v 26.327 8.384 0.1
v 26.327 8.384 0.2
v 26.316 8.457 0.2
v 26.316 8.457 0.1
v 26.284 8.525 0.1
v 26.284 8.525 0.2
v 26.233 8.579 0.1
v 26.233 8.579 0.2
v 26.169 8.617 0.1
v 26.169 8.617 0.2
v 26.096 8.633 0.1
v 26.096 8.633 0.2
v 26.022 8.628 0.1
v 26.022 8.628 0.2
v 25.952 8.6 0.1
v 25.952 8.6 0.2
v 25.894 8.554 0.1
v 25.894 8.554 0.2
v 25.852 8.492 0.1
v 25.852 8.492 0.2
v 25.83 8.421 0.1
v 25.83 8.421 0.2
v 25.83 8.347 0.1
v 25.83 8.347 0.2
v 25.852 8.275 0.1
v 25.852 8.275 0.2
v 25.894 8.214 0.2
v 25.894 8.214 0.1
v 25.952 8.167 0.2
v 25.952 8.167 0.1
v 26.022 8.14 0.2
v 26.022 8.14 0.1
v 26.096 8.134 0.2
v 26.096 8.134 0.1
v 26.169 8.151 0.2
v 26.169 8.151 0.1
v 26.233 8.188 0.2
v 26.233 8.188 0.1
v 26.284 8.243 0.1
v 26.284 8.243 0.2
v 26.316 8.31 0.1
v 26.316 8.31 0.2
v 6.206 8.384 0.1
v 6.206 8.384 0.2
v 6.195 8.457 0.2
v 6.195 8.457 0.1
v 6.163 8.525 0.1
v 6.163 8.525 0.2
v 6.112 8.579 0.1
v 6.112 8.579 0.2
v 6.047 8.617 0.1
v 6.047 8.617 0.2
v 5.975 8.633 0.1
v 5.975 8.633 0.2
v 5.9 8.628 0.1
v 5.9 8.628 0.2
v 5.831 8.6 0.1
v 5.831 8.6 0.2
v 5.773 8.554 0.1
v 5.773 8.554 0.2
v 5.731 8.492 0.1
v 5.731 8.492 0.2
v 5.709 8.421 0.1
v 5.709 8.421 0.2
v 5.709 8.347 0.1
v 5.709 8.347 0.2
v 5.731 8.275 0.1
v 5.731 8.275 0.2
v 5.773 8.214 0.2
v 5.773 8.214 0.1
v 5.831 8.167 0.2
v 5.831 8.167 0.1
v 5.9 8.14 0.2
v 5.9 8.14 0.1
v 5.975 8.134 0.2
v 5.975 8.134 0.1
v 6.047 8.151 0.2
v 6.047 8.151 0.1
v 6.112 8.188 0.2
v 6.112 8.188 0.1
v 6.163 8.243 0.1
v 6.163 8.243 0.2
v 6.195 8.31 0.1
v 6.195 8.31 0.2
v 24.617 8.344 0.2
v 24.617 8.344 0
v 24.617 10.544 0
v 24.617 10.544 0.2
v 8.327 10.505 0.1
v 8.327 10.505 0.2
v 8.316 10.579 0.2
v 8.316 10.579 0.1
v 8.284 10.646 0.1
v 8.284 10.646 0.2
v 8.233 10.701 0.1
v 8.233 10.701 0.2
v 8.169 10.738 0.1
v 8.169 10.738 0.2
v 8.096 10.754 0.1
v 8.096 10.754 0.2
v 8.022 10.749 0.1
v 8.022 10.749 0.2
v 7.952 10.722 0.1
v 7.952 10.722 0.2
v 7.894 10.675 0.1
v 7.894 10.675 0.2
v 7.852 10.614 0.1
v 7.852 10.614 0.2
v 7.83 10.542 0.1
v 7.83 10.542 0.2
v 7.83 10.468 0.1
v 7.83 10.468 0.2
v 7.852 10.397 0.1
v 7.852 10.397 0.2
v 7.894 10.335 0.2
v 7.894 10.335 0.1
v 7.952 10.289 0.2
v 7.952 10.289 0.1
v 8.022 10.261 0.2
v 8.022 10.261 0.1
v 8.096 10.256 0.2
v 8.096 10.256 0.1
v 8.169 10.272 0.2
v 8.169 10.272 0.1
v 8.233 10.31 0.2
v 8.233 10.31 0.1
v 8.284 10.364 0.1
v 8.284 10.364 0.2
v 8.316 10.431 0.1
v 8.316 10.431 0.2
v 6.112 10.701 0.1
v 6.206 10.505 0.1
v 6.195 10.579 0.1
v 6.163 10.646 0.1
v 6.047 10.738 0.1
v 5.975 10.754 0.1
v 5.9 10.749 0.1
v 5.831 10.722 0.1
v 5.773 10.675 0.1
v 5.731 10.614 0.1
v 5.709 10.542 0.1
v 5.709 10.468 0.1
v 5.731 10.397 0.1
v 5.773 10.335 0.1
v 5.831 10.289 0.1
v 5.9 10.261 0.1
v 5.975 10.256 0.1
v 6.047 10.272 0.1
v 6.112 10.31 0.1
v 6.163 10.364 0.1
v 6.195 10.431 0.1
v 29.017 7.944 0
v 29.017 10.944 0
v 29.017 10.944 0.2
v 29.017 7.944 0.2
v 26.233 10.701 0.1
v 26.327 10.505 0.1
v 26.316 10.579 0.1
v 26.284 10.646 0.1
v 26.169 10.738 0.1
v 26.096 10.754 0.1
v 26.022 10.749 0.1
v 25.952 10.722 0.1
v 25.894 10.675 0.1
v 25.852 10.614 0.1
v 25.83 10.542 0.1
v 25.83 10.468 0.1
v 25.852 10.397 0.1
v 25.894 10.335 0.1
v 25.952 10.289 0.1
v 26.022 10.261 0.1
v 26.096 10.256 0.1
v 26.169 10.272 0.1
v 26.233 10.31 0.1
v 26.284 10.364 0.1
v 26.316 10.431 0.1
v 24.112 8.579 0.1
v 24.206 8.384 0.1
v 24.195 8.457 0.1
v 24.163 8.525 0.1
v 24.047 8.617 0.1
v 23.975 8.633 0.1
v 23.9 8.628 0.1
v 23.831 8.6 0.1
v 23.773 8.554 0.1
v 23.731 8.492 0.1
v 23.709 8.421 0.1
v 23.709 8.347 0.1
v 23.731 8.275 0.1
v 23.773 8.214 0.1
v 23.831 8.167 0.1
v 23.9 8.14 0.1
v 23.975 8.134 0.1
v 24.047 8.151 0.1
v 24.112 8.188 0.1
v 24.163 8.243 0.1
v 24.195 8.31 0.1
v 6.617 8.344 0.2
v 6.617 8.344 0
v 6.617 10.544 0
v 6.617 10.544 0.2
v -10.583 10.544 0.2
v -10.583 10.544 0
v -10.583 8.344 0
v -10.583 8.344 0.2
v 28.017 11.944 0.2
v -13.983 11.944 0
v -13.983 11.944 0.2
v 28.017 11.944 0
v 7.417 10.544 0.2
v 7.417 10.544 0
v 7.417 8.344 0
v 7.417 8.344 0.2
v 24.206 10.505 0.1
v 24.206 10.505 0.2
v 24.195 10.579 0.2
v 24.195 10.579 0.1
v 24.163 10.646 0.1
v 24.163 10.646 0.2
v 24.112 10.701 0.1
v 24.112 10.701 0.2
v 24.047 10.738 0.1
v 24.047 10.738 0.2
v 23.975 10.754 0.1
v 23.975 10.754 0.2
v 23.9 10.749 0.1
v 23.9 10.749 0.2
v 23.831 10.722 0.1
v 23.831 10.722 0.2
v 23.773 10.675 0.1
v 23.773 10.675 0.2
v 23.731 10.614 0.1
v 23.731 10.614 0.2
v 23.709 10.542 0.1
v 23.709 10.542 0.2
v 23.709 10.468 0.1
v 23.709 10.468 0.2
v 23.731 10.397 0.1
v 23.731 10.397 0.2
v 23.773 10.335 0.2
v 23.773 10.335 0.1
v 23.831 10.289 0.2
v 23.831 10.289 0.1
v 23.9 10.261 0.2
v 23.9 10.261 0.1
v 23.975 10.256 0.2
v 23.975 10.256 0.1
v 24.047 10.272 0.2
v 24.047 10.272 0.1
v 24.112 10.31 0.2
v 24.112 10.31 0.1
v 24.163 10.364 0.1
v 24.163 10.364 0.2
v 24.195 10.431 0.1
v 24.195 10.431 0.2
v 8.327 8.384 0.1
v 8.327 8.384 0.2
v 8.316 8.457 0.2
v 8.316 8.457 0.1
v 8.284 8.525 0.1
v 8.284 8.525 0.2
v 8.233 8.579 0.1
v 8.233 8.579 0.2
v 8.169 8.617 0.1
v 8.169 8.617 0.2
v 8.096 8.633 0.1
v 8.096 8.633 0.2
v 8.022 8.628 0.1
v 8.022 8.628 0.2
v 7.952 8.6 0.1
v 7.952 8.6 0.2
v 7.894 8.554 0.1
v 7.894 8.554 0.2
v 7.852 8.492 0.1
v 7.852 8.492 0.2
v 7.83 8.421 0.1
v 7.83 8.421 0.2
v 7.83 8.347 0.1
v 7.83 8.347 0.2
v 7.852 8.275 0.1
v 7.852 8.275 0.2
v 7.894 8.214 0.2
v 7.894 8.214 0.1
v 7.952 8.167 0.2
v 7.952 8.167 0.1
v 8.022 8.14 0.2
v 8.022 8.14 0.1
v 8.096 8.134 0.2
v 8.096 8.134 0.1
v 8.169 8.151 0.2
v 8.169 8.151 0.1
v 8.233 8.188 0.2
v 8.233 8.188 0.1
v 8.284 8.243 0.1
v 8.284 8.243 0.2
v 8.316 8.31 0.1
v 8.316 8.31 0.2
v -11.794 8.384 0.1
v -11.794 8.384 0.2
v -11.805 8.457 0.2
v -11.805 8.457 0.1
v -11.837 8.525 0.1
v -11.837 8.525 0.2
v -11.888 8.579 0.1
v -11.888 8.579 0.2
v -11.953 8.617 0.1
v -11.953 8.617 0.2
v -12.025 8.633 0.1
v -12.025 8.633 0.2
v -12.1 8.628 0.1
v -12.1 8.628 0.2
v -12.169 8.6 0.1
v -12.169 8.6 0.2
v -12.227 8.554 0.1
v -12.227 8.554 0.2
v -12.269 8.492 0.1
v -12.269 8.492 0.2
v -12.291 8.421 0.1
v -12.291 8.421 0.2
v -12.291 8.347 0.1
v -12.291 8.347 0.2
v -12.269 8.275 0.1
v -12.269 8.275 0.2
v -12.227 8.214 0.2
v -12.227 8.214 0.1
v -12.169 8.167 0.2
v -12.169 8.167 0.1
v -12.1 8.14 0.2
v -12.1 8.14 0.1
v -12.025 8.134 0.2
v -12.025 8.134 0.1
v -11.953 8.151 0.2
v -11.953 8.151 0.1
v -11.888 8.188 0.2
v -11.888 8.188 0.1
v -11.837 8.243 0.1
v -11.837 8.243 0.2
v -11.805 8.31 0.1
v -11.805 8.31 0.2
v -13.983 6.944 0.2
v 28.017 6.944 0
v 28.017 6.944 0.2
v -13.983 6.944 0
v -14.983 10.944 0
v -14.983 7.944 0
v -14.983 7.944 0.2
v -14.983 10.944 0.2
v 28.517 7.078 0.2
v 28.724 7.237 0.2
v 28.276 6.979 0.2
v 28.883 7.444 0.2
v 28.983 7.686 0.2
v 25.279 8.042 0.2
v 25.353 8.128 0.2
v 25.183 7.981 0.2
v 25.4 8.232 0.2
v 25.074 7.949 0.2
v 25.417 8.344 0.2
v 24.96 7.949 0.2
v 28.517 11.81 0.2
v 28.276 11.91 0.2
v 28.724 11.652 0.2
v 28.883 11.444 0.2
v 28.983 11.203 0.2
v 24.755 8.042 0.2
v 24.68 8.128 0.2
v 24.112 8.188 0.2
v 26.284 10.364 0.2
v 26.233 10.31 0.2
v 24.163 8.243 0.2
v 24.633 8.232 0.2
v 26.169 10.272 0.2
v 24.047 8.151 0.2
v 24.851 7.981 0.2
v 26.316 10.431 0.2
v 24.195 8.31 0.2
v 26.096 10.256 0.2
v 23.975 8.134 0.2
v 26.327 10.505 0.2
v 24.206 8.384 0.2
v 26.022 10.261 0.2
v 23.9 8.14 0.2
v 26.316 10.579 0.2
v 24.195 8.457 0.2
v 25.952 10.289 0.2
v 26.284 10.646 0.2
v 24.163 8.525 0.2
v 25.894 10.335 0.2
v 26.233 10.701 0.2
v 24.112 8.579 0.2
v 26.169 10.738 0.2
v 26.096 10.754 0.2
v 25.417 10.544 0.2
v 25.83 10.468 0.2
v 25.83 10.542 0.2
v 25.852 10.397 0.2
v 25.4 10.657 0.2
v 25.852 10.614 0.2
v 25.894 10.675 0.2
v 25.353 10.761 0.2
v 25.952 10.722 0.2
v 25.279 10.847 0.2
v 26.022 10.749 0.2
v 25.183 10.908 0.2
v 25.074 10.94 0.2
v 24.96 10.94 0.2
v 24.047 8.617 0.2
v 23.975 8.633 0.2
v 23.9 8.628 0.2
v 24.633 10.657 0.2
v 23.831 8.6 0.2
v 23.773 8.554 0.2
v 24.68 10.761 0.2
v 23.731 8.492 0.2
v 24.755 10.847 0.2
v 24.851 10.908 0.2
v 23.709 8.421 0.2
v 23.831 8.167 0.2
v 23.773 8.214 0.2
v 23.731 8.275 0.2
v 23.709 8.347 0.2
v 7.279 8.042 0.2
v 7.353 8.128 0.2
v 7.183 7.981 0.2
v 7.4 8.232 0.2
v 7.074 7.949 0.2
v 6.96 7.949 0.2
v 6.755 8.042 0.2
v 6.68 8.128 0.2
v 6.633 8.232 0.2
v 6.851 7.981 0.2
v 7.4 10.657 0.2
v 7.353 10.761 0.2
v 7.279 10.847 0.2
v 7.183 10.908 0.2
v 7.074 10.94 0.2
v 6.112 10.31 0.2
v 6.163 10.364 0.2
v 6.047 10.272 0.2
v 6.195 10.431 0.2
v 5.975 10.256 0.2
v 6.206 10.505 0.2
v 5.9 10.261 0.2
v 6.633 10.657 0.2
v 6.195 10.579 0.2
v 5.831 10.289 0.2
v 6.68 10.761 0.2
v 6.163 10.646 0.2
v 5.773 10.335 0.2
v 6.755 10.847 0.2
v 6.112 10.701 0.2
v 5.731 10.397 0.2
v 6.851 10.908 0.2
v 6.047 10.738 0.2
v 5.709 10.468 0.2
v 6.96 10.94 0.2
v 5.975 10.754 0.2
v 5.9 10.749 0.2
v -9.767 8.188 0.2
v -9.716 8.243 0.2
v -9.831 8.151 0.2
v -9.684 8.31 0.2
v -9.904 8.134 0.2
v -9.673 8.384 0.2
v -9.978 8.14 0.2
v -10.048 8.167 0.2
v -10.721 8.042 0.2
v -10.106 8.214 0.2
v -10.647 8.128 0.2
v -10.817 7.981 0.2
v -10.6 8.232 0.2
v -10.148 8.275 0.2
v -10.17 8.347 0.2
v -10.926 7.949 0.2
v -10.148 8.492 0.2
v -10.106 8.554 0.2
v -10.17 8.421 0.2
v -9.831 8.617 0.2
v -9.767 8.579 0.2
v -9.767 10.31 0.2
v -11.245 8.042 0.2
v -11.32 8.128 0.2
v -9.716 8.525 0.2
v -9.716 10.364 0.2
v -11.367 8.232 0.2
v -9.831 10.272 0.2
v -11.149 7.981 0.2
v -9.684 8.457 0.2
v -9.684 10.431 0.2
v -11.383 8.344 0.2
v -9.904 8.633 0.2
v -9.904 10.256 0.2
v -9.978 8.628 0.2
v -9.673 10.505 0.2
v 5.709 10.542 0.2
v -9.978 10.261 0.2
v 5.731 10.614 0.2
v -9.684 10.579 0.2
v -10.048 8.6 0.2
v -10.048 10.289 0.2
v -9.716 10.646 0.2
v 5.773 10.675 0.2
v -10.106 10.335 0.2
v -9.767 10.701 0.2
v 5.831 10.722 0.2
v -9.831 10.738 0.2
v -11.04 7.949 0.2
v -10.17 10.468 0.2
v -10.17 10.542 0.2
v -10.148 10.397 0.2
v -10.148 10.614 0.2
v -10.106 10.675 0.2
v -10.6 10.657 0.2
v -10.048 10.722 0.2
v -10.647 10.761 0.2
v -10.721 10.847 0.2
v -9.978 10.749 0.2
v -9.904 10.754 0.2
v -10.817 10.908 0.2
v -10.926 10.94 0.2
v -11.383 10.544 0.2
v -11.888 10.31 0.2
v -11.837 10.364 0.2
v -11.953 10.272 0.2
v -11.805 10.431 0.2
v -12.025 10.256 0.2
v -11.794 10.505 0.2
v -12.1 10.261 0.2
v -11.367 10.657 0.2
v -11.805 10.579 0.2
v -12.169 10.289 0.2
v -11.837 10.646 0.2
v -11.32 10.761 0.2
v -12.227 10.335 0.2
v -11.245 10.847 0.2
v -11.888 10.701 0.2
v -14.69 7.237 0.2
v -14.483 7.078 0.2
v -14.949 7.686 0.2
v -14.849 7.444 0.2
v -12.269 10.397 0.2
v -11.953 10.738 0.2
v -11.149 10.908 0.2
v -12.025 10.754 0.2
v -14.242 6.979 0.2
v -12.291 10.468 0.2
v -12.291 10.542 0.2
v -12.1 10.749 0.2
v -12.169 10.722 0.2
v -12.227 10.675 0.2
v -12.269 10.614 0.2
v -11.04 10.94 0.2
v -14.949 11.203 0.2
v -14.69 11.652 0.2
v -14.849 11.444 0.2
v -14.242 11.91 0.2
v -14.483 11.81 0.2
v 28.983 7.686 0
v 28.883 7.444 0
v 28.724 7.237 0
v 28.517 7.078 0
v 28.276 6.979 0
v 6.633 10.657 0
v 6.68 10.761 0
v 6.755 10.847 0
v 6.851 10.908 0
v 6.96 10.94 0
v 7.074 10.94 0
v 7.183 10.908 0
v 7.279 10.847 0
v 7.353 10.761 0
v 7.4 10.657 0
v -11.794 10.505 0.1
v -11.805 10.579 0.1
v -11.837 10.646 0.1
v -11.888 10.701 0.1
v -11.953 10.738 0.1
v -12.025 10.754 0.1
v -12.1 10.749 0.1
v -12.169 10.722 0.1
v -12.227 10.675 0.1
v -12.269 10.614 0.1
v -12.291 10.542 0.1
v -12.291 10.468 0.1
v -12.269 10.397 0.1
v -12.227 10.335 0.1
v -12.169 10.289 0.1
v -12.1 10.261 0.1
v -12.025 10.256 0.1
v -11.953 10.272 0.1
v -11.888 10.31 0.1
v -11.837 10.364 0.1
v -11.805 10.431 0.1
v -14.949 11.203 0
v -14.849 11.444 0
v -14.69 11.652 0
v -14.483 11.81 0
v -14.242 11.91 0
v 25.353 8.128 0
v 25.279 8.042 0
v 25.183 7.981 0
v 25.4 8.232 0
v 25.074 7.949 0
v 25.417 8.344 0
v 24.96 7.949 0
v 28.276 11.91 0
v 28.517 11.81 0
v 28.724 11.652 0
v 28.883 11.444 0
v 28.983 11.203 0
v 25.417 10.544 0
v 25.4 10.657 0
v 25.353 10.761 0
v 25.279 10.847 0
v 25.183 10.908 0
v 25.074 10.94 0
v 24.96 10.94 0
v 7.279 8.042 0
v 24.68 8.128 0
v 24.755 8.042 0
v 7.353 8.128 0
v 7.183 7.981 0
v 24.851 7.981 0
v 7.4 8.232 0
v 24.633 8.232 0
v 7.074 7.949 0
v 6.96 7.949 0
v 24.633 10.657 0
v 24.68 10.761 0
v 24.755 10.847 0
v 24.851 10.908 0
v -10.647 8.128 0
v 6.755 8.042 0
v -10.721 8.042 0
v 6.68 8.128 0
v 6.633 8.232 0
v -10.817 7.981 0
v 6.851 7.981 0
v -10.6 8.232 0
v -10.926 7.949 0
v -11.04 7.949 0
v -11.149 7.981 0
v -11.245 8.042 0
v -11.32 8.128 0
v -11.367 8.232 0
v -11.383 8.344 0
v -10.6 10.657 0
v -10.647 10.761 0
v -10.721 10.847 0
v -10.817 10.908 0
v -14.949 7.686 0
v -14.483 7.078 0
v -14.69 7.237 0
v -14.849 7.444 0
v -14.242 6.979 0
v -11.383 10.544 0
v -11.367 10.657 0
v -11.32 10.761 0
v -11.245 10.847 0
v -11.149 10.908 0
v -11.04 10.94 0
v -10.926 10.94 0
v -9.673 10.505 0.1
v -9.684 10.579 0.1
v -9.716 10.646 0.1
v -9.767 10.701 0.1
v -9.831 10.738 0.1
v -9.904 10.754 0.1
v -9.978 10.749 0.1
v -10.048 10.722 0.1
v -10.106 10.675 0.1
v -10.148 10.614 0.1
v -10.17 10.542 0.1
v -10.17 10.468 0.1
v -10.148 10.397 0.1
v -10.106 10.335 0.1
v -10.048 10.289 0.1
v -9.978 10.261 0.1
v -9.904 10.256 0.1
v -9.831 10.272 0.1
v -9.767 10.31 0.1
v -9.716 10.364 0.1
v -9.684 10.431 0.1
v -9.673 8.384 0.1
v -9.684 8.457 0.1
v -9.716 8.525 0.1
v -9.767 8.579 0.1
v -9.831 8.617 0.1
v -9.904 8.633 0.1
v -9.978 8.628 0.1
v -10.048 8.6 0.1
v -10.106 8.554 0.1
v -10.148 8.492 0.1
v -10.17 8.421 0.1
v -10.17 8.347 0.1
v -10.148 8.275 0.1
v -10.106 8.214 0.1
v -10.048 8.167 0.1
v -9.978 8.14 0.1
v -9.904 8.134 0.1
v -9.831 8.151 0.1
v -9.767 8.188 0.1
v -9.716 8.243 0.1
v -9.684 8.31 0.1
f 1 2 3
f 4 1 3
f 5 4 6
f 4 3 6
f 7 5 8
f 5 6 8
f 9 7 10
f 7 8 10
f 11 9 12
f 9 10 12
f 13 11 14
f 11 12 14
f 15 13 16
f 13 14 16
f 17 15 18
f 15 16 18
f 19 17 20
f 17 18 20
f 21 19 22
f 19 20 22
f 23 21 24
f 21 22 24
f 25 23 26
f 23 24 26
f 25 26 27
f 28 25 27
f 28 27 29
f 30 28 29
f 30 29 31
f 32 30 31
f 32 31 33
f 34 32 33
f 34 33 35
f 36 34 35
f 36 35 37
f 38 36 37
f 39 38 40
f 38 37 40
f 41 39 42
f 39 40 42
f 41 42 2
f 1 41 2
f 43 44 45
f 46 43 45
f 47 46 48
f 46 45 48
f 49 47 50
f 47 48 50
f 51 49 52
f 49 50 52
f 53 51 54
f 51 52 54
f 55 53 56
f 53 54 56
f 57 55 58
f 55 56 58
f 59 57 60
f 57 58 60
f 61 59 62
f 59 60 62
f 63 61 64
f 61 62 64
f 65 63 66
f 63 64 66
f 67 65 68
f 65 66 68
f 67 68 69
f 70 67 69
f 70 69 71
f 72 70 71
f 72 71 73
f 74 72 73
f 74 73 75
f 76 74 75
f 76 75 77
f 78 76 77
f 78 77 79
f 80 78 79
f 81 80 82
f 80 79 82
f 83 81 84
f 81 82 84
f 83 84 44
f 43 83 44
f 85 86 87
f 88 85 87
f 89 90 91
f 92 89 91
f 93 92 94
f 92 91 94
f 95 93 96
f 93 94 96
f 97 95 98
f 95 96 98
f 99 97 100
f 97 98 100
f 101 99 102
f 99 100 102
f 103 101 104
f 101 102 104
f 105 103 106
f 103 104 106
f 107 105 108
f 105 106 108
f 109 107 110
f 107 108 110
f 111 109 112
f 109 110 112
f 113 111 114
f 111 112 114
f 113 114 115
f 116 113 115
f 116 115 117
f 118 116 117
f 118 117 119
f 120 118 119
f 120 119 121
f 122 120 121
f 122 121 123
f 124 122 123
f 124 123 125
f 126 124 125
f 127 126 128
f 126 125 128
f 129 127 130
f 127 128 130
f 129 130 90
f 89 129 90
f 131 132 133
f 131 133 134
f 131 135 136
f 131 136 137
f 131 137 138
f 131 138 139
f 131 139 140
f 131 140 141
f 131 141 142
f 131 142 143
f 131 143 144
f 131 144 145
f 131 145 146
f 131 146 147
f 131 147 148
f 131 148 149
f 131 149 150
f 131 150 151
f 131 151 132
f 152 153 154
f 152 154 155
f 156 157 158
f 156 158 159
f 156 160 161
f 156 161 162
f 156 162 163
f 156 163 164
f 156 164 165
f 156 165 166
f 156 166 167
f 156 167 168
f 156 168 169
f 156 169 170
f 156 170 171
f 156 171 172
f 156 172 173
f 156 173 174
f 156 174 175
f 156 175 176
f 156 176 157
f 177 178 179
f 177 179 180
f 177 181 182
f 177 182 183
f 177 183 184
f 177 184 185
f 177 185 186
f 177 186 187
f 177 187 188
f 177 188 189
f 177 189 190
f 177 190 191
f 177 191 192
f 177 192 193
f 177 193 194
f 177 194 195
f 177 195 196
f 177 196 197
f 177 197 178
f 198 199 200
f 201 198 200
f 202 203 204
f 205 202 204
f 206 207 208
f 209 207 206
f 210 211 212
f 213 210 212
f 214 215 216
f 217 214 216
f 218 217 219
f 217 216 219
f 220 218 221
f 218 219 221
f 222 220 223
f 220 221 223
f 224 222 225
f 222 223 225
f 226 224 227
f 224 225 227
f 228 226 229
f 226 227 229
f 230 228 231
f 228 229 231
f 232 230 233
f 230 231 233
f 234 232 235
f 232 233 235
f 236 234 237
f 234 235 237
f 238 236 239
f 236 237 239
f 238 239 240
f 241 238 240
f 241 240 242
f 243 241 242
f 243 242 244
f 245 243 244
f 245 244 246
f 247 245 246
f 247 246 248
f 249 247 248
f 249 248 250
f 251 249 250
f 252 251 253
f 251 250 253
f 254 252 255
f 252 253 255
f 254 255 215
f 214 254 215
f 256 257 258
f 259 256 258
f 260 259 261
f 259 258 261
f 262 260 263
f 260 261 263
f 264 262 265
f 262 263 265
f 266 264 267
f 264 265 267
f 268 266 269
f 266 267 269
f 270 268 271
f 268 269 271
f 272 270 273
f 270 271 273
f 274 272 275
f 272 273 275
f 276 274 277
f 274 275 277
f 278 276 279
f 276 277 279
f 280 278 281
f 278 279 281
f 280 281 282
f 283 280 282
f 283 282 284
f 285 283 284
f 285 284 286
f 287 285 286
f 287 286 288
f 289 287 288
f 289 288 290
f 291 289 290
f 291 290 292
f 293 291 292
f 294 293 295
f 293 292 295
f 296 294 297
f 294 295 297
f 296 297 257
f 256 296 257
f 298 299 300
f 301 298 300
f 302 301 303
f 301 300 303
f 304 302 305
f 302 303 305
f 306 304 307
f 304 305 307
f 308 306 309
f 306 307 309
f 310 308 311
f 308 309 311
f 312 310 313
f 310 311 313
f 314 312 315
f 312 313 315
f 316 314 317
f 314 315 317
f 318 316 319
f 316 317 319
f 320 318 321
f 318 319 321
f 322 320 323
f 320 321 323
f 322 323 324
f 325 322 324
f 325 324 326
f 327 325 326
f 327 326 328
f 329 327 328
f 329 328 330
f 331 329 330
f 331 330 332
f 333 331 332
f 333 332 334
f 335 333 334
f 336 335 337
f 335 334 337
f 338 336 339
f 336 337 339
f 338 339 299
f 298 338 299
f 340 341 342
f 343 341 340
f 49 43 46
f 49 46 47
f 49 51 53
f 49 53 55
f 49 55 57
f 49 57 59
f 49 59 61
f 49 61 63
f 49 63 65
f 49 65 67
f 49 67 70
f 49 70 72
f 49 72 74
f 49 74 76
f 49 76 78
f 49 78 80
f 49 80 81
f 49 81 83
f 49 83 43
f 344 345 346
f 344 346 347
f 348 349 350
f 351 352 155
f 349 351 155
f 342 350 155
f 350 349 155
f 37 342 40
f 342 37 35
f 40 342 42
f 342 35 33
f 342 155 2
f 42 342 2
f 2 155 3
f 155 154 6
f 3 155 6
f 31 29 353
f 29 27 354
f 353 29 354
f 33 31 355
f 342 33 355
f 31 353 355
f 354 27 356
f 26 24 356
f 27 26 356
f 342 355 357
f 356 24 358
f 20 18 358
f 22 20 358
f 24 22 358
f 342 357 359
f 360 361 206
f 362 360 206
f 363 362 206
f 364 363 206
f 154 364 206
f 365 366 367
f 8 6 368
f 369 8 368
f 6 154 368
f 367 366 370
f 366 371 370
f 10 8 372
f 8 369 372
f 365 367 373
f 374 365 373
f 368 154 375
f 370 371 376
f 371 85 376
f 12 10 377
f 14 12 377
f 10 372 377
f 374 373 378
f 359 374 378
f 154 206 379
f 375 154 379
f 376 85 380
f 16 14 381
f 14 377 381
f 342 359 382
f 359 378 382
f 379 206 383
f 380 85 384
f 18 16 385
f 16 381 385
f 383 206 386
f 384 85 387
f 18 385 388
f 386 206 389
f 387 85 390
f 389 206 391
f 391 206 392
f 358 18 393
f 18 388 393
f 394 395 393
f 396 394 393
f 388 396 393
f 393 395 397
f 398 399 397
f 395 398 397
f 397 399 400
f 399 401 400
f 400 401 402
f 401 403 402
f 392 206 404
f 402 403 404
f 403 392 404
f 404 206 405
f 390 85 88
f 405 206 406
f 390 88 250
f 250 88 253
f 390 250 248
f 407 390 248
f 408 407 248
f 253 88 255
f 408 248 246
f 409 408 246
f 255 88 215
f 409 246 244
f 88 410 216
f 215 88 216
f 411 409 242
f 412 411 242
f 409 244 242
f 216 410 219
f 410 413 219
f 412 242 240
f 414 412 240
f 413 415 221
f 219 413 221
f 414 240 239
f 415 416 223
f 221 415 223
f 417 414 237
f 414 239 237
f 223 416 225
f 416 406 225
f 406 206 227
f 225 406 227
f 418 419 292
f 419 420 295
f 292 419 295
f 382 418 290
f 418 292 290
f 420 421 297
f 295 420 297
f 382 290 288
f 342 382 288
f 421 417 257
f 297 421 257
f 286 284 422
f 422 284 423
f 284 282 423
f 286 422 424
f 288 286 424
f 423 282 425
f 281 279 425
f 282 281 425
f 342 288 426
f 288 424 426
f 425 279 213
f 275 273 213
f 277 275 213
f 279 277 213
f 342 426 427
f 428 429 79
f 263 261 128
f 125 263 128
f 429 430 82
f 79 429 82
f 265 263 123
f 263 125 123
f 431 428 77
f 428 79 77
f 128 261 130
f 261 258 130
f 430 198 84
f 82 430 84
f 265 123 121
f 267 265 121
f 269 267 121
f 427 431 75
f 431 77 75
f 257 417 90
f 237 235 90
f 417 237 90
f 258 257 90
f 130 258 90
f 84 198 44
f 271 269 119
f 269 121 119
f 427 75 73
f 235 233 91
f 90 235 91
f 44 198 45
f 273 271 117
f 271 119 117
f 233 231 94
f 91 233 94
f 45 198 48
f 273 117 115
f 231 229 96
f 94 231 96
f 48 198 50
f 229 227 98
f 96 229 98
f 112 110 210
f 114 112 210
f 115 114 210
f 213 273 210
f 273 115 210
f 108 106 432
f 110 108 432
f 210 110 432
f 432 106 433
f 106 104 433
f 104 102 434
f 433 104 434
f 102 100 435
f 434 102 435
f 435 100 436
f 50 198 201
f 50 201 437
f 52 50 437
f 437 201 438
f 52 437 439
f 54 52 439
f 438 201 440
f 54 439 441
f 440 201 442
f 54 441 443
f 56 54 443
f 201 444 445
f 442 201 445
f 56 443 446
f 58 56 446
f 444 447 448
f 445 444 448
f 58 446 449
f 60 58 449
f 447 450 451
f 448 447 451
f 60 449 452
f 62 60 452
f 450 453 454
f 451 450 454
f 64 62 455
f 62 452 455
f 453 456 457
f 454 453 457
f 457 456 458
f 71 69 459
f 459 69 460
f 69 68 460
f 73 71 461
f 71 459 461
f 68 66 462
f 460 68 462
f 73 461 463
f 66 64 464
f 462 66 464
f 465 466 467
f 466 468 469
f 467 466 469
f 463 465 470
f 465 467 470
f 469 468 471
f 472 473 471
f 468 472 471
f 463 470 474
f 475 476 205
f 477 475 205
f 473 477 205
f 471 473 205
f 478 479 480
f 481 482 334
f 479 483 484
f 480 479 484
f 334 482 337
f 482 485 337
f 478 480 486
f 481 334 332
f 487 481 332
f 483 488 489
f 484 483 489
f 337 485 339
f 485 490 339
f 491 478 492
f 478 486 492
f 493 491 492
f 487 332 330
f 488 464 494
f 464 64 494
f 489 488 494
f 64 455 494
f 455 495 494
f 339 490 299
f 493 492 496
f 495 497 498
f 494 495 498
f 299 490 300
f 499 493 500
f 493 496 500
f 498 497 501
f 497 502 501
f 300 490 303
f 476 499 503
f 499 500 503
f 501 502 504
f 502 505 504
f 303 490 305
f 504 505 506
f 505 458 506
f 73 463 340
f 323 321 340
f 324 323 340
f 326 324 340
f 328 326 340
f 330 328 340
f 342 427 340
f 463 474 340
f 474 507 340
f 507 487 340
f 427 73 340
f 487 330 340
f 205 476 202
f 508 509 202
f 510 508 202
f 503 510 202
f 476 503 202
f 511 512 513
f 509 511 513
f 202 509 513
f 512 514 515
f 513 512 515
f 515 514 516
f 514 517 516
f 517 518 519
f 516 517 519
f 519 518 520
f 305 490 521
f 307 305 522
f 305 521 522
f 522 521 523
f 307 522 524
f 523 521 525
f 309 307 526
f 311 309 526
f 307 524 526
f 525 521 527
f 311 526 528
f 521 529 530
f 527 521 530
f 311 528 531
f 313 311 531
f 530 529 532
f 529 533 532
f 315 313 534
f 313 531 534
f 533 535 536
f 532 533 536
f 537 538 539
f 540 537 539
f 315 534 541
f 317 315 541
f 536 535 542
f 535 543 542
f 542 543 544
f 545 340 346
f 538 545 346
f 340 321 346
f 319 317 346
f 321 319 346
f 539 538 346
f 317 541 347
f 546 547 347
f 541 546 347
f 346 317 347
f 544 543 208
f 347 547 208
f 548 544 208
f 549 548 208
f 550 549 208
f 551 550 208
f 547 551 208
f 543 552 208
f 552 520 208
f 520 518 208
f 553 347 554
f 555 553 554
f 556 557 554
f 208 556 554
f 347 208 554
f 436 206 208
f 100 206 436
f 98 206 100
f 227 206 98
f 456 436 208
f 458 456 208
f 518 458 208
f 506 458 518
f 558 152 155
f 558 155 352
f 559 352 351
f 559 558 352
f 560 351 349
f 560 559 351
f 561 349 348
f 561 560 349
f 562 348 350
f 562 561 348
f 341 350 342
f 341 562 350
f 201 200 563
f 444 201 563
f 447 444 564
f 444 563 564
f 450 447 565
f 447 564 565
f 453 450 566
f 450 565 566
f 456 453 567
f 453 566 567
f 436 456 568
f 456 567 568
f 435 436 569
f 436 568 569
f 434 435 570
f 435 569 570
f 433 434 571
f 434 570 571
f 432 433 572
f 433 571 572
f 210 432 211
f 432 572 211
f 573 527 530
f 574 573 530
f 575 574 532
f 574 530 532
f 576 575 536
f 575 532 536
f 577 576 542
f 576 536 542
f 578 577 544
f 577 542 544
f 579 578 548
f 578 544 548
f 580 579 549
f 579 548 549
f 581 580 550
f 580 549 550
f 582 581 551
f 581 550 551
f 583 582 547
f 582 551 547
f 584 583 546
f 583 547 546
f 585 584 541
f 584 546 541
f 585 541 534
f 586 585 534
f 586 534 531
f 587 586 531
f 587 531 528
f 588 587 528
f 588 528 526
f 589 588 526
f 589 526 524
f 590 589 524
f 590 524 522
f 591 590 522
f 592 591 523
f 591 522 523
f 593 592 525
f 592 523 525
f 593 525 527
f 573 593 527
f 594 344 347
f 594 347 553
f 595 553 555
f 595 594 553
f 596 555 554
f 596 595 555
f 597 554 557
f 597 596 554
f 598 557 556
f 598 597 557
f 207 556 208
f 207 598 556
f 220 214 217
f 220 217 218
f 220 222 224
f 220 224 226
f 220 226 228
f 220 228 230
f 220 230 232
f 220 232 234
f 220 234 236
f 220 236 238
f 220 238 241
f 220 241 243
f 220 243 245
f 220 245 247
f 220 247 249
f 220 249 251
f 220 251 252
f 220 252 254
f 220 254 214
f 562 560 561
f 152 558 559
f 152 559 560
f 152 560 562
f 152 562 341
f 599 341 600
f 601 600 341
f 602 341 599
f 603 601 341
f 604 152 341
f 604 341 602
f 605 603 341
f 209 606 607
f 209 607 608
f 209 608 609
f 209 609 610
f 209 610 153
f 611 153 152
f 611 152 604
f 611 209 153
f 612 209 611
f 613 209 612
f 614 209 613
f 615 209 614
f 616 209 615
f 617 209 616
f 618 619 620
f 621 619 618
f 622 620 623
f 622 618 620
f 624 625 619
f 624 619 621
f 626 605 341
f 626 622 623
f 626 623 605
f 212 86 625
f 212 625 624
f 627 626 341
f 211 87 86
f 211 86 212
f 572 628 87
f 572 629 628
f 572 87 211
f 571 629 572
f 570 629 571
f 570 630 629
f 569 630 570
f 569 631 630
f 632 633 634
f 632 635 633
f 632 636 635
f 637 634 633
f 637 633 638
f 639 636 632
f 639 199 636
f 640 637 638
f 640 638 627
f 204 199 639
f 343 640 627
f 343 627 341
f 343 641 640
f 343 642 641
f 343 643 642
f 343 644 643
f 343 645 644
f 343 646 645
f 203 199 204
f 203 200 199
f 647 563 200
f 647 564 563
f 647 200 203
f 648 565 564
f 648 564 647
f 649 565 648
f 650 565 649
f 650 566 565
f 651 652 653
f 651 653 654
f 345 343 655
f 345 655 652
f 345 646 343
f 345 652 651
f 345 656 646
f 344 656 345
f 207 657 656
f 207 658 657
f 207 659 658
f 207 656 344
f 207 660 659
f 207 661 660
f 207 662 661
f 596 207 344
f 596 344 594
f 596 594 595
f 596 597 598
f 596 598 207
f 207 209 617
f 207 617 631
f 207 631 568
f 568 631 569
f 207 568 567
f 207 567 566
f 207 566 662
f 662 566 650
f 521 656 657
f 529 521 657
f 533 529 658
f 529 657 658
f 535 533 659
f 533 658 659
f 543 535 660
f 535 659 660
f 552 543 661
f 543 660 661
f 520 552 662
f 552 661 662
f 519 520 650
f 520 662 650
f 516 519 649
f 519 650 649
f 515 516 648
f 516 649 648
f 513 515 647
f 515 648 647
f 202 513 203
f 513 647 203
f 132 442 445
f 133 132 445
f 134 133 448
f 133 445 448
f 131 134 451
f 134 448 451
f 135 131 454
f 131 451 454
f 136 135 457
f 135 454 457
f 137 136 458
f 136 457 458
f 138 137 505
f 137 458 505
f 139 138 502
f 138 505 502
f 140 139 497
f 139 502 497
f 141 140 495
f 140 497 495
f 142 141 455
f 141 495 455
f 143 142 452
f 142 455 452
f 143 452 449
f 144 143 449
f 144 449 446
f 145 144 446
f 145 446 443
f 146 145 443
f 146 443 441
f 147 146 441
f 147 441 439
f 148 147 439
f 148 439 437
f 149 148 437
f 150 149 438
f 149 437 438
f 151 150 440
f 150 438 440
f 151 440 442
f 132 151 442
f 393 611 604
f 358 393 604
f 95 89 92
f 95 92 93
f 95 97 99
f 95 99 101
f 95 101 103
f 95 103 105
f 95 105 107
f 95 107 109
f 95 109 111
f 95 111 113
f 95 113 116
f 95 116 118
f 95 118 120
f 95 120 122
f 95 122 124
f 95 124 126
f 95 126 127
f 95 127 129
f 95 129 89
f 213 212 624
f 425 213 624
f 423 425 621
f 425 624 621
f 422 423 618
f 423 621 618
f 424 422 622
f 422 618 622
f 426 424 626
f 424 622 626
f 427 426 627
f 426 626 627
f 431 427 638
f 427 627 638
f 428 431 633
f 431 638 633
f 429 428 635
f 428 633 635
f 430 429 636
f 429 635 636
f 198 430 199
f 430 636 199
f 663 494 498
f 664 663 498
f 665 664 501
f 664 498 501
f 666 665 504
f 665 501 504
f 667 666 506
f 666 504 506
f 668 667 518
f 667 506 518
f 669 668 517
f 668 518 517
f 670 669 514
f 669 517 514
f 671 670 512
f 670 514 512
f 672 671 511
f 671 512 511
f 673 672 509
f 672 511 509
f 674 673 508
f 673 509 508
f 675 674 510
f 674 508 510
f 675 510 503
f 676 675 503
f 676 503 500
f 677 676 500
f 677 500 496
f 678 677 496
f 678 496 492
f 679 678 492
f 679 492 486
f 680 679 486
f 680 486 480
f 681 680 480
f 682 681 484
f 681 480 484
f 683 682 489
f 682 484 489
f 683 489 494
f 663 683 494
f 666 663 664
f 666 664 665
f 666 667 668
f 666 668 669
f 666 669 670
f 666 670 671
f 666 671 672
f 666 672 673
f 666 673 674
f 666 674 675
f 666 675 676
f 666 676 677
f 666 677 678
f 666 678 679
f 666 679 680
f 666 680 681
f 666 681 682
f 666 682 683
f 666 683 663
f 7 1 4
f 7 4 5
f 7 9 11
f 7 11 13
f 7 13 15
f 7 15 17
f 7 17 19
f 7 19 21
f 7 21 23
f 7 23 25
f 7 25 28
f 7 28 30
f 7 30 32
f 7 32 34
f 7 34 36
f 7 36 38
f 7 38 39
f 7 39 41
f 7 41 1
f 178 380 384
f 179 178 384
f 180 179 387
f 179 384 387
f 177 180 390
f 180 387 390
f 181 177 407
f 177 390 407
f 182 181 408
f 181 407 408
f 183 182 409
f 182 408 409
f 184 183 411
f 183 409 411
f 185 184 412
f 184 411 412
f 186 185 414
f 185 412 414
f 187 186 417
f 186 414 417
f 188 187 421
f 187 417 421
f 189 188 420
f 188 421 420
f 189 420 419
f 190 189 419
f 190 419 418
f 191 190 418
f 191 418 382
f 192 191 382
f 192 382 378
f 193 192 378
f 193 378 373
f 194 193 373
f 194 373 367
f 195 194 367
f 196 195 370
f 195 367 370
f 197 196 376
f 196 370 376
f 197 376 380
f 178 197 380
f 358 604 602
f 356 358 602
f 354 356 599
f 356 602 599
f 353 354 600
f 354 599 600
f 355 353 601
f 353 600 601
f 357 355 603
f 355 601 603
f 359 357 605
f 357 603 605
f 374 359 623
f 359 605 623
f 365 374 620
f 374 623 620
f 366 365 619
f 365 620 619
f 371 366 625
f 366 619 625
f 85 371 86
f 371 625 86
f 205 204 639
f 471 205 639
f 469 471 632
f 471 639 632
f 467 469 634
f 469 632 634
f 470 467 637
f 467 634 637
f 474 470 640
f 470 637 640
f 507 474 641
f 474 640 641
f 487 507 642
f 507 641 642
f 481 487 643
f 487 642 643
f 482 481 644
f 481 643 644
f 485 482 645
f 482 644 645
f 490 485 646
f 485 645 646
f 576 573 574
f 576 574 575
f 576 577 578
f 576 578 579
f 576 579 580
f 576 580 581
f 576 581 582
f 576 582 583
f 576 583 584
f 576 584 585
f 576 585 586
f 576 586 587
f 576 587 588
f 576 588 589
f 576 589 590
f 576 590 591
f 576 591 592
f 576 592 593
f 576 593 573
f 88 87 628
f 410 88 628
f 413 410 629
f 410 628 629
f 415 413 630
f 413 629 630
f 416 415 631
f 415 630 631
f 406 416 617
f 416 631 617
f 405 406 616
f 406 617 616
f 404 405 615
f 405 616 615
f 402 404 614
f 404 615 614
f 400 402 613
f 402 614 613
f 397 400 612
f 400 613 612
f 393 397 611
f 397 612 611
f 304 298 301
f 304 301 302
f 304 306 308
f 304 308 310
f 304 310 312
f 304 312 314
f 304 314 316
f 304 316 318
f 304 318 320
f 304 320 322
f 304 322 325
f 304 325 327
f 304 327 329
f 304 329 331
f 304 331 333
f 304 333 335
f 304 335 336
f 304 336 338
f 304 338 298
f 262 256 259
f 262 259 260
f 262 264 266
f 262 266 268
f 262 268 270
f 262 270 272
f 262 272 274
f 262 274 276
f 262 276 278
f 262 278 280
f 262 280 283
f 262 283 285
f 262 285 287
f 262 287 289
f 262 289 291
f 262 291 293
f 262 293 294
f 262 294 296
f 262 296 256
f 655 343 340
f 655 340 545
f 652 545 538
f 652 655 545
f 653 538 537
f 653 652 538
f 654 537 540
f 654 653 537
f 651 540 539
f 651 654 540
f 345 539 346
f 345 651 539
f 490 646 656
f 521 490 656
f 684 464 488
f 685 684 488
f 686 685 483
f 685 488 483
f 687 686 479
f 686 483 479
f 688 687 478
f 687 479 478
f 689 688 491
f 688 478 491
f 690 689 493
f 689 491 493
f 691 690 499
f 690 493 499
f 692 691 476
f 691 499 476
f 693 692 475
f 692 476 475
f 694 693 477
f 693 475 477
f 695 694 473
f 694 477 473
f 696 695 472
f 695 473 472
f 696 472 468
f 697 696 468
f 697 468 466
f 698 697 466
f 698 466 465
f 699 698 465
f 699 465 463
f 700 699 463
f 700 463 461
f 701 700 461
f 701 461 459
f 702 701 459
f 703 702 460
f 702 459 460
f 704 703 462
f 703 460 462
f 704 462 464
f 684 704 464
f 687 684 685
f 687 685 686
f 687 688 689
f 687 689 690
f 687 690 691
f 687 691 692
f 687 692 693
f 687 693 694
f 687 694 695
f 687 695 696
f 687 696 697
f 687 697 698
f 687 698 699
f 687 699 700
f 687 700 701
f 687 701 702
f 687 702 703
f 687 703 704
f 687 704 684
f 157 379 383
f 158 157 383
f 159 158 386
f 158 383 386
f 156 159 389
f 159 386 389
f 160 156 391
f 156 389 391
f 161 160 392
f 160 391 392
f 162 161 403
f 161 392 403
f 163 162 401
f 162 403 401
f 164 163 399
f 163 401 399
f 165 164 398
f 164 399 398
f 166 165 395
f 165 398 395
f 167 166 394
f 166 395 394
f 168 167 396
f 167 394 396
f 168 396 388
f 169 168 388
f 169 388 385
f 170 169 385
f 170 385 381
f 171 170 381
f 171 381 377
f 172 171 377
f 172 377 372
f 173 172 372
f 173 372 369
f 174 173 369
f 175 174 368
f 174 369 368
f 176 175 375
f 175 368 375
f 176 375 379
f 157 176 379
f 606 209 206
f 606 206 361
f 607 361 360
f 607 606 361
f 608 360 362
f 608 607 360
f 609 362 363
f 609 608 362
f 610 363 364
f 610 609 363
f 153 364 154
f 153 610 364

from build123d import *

# Parameters (mm, degrees)
BOSS_EXTRUDE1_DEPTH = 0.2
SKETCH2_R           = 0.25
CUT_EXTRUDE1_DEPTH  = 0.1


with BuildPart() as part:
    # Sketch1 → Boss-Extrude1 (new body)
    with BuildSketch(Plane.XY):
        with BuildLine():
            Line((-13.983305509, 11.944444444), (28.016694491, 11.944444444))
            ThreePointArc((28.016694491, 11.944444444), (28.723801272, 11.651551226), (29.016694491, 10.944444444))
            Line((29.016694491, 10.944444444), (29.016694491, 7.944444444))
            ThreePointArc((29.016694491, 7.944444444), (28.723801272, 7.237337663), (28.016694491, 6.944444444))
            Line((28.016694491, 6.944444444), (-13.983305509, 6.944444444))
            ThreePointArc((-13.983305509, 6.944444444), (-14.69041229, 7.237337663), (-14.983305509, 7.944444444))
            Line((-14.983305509, 7.944444444), (-14.983305509, 10.944444444))
            ThreePointArc((-14.983305509, 10.944444444), (-14.69041229, 11.651551226), (-13.983305509, 11.944444444))
        make_face()
        with BuildLine():
            Line((-10.583305509, 10.544444444), (-10.583305509, 8.344444444))
            ThreePointArc((-10.583305509, 8.344444444), (-10.983305509, 7.944444444), (-11.383305509, 8.344444444))
            Line((-11.383305509, 8.344444444), (-11.383305509, 10.544444444))
            ThreePointArc((-11.383305509, 10.544444444), (-10.983305509, 10.944444444), (-10.583305509, 10.544444444))
        make_face(mode=Mode.SUBTRACT)
        with BuildLine():
            Line((7.416694491, 10.544444444), (7.416694491, 8.344444444))
            ThreePointArc((7.416694491, 8.344444444), (7.016694491, 7.944444444), (6.616694491, 8.344444444))
            Line((6.616694491, 8.344444444), (6.616694491, 10.544444444))
            ThreePointArc((6.616694491, 10.544444444), (7.016694491, 10.944444444), (7.416694491, 10.544444444))
        make_face(mode=Mode.SUBTRACT)
        with BuildLine():
            Line((25.416694491, 10.544444444), (25.416694491, 8.344444444))
            ThreePointArc((25.416694491, 8.344444444), (25.016694491, 7.944444444), (24.616694491, 8.344444444))
            Line((24.616694491, 8.344444444), (24.616694491, 10.544444444))
            ThreePointArc((24.616694491, 10.544444444), (25.016694491, 10.944444444), (25.416694491, 10.544444444))
        make_face(mode=Mode.SUBTRACT)
    extrude(amount=BOSS_EXTRUDE1_DEPTH)

    # Sketch2 → Cut-Extrude1 (cut)
    with BuildSketch(Plane.XY.offset(0.2)):
        with Locations((-9.922645337, 10.505104616)):
            Circle(SKETCH2_R)
        with Locations((-9.922645337, 8.383784273)):
            Circle(SKETCH2_R)
        with Locations((-12.043965681, 8.383784273)):
            Circle(SKETCH2_R)
        with Locations((-12.043965681, 10.505104616)):
            Circle(SKETCH2_R)
        with Locations((8.077354663, 10.505104616)):
            Circle(SKETCH2_R)
        with Locations((5.956034319, 10.505104616)):
            Circle(SKETCH2_R)
        with Locations((5.956034319, 8.383784273)):
            Circle(SKETCH2_R)
        with Locations((8.077354663, 8.383784273)):
            Circle(SKETCH2_R)
        with Locations((26.077354663, 10.505104616)):
            Circle(SKETCH2_R)
        with Locations((23.956034319, 10.505104616)):
            Circle(SKETCH2_R)
        with Locations((23.956034319, 8.383784273)):
            Circle(SKETCH2_R)
        with Locations((26.077354663, 8.383784273)):
            Circle(SKETCH2_R)
    extrude(amount=-CUT_EXTRUDE1_DEPTH, mode=Mode.SUBTRACT)


solid = part.part
